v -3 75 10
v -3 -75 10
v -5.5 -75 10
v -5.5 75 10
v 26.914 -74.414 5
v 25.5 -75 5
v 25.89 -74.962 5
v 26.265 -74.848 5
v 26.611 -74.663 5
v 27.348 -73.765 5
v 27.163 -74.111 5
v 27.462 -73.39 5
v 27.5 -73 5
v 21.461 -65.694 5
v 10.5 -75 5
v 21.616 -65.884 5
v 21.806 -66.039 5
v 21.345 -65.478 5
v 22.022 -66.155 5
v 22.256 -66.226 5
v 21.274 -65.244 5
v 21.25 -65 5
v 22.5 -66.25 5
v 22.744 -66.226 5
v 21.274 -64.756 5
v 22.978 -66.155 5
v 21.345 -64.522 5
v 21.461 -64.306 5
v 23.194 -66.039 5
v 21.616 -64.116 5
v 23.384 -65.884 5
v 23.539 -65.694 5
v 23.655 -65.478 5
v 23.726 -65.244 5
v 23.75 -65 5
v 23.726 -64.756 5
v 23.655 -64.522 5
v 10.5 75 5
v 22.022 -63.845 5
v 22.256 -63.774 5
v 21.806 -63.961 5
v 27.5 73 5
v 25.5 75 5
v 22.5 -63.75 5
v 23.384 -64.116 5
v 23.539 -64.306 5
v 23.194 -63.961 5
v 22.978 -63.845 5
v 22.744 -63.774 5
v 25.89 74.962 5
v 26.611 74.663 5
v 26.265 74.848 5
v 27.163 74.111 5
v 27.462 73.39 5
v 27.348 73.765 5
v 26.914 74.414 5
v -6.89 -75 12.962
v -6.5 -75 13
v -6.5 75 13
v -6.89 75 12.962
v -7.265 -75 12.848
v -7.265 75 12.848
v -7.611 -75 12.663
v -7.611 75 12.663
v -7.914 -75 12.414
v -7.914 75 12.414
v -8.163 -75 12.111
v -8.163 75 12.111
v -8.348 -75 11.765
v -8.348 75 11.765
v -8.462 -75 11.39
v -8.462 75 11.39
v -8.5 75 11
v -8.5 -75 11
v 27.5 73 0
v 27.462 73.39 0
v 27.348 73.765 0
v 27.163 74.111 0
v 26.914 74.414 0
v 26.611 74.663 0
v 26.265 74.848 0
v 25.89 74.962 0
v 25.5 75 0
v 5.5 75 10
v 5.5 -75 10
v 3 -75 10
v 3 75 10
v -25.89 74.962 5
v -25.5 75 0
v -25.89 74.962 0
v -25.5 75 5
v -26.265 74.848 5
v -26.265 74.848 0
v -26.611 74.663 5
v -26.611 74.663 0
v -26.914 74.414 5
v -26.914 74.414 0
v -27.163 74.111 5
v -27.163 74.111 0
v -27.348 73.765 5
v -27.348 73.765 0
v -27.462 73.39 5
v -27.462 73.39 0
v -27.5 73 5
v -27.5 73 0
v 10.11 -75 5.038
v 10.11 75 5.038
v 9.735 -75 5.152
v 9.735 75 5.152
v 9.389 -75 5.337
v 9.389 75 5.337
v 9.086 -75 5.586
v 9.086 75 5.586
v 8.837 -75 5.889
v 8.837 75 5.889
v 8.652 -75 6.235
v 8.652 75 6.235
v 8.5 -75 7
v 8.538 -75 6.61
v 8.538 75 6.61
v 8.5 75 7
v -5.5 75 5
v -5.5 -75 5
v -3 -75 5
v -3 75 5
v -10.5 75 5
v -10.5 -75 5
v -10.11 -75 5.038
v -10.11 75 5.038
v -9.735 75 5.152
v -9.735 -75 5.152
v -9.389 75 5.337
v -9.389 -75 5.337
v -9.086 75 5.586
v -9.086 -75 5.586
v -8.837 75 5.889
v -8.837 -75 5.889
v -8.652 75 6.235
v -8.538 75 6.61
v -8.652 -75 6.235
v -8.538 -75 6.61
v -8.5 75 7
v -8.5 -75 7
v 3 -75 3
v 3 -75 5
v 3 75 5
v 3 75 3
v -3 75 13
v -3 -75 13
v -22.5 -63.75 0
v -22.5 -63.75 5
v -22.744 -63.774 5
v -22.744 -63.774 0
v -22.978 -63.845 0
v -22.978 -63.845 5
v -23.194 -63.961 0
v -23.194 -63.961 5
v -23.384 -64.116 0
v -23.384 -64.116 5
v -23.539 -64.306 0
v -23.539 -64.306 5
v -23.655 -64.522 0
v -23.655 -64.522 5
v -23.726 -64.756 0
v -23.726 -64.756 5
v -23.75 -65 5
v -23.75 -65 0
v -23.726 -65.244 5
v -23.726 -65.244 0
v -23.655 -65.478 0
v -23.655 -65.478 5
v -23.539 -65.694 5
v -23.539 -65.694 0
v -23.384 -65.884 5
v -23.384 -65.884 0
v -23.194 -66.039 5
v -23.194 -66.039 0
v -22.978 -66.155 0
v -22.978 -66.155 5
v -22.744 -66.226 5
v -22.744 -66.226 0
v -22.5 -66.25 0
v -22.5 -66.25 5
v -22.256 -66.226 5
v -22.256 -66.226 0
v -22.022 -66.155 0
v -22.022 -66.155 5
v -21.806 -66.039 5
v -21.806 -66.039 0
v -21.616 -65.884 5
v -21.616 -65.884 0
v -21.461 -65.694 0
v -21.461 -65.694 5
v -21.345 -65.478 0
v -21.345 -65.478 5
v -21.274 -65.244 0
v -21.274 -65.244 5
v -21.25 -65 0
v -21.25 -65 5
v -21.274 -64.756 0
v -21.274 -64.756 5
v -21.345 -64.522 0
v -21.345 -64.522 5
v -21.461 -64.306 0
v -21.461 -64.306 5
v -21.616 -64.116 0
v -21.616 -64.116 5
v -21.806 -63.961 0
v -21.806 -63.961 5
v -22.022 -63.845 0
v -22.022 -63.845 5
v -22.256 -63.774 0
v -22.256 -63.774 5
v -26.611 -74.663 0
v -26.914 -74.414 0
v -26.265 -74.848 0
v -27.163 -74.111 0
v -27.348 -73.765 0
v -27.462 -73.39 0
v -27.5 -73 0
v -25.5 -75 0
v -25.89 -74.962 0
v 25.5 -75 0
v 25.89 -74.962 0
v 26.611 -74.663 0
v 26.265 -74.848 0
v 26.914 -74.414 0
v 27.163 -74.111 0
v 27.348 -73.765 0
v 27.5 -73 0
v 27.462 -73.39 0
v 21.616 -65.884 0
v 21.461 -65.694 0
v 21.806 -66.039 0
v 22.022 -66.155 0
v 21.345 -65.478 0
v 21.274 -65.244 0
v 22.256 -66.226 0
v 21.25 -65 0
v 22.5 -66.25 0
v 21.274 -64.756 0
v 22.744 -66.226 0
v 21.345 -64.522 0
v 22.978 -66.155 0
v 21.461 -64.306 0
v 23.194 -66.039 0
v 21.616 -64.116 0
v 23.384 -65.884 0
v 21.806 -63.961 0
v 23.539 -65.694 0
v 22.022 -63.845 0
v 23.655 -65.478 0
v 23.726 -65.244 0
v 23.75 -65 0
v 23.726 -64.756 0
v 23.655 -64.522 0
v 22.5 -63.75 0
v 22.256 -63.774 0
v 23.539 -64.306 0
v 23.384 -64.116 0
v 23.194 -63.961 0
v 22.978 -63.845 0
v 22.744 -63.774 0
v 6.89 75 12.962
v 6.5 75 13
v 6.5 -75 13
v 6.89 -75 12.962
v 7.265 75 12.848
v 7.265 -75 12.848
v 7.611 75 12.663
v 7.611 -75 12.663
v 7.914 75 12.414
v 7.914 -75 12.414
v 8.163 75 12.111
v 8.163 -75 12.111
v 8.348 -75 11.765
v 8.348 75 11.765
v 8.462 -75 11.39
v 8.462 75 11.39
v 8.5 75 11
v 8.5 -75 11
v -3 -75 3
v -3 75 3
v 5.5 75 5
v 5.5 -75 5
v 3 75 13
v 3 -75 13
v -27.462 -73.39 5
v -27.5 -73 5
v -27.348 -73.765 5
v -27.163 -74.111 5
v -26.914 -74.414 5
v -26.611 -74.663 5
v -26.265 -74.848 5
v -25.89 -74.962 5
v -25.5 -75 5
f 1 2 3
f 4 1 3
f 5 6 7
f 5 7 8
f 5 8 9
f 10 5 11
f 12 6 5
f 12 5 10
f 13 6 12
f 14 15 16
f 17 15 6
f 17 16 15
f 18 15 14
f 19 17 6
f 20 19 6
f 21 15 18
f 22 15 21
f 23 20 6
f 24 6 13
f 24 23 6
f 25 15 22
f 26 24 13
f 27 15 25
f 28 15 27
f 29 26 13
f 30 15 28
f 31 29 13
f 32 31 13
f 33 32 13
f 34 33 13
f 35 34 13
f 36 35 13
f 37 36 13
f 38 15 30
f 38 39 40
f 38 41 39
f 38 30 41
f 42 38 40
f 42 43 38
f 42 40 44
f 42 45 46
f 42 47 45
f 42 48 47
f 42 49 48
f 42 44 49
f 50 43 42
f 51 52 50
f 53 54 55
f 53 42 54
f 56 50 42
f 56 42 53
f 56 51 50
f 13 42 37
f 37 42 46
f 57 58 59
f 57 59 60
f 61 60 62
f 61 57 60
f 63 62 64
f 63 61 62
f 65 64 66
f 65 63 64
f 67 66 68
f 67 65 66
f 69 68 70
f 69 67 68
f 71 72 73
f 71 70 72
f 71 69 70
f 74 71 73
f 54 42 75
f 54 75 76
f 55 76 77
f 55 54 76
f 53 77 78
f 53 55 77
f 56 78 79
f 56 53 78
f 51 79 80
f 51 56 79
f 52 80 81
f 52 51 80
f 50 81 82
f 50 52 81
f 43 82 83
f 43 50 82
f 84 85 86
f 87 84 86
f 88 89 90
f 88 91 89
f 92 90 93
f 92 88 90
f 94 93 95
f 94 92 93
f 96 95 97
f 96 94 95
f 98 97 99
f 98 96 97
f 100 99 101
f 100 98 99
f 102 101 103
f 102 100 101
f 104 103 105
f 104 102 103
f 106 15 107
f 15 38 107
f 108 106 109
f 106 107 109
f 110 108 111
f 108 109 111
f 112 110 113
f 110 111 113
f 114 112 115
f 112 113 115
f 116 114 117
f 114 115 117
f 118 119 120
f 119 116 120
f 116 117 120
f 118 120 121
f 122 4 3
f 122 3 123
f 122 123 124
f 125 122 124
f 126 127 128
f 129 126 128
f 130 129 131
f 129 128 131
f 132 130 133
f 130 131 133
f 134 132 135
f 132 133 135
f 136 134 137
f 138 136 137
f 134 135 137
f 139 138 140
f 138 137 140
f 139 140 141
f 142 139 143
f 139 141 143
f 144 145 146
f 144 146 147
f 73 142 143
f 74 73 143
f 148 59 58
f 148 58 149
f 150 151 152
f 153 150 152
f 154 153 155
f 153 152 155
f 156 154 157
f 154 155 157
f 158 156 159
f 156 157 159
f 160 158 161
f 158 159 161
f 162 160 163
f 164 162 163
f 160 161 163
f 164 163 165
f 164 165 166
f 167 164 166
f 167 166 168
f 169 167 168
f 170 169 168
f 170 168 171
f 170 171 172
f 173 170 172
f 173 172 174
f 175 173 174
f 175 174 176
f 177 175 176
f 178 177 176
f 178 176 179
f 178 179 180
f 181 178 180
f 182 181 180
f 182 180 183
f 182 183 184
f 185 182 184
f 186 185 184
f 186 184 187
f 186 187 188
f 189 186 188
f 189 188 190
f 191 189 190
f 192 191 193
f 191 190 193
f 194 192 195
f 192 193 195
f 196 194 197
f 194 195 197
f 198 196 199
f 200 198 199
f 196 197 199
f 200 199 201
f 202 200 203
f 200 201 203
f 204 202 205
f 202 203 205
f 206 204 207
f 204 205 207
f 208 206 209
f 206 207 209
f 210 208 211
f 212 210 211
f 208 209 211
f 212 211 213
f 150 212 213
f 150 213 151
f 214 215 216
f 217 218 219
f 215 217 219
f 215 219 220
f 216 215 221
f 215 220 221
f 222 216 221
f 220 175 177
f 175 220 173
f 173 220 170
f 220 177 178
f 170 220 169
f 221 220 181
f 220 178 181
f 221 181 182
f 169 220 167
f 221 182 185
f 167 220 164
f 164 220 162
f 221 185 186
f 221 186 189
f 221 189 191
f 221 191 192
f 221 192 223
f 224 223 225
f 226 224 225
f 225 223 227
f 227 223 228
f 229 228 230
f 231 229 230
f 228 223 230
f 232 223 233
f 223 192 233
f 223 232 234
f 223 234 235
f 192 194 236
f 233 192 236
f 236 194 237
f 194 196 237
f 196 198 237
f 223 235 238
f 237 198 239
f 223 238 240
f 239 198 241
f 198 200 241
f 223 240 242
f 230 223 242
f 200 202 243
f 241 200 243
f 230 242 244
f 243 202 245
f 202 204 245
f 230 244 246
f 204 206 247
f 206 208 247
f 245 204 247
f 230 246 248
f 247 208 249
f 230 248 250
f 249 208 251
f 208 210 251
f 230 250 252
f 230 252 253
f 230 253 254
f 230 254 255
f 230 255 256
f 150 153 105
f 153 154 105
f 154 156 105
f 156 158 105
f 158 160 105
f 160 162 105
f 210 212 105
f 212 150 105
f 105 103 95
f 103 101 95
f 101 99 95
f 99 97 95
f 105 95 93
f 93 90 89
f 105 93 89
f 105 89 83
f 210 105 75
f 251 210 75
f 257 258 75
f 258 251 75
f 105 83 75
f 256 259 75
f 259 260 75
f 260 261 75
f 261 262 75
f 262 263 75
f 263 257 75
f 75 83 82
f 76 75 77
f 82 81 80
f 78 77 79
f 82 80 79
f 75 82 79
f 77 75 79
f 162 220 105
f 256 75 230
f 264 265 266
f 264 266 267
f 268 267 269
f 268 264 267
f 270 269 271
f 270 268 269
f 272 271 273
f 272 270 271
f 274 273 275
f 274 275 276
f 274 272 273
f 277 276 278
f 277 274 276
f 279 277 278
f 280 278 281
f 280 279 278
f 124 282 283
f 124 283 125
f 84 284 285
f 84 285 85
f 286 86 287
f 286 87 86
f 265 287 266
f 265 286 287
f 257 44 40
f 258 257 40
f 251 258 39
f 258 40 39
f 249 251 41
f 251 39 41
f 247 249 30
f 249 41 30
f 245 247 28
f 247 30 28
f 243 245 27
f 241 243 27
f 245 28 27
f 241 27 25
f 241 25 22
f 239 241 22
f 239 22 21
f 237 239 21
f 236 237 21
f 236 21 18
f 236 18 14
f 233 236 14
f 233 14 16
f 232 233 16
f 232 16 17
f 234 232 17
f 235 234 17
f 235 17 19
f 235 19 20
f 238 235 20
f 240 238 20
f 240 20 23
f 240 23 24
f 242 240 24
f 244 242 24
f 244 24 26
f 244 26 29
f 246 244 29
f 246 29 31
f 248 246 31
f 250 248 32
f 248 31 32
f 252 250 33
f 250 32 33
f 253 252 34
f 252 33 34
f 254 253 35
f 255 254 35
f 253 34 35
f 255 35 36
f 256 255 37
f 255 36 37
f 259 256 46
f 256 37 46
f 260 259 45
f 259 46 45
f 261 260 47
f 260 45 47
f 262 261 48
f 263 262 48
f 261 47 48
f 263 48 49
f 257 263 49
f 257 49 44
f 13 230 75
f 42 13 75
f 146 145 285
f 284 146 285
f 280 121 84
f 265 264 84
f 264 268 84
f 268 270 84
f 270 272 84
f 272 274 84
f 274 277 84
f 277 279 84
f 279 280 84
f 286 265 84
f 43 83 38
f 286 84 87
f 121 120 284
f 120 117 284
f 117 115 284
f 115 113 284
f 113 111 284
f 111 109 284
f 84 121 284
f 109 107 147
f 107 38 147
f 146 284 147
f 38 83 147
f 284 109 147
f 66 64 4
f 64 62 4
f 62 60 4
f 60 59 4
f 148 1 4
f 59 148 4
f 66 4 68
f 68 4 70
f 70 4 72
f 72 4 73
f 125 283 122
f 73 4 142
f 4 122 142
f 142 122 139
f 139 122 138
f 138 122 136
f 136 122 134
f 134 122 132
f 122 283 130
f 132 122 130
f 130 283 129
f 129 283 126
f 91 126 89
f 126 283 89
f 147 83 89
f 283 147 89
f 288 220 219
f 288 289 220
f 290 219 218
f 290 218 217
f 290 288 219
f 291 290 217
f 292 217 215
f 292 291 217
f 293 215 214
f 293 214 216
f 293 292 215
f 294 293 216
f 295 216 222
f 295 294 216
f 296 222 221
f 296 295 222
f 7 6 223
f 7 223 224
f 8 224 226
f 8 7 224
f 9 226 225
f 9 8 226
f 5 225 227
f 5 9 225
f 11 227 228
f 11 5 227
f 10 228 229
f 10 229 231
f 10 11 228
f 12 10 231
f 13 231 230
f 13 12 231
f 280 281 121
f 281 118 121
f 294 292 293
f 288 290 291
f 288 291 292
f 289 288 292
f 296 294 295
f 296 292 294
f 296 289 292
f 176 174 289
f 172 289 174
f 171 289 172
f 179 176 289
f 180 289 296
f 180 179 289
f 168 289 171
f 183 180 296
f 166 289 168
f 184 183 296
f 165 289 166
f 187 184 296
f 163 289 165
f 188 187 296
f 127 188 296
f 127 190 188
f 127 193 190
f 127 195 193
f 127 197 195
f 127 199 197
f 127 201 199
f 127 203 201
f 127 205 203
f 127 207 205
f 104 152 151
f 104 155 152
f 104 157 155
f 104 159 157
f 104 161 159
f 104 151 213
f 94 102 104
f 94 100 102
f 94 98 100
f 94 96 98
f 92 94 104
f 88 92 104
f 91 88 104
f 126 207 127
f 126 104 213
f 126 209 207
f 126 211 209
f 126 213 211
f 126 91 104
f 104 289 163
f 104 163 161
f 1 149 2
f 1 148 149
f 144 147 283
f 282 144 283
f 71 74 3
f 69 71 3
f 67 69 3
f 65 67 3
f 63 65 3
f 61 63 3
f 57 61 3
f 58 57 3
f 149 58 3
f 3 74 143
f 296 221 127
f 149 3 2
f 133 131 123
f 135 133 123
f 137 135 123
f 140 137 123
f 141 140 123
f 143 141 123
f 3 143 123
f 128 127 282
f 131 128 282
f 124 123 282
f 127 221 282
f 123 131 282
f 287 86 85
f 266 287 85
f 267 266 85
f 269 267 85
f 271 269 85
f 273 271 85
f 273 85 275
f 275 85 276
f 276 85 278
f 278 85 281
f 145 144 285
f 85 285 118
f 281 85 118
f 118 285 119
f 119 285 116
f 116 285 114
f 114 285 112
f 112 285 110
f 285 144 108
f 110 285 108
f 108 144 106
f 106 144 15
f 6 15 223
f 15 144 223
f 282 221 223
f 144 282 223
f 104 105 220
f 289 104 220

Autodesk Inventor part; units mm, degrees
ref_plane "YZ Plane" through (0, 0, 0) normal (1, 0, 0) x (0, 1, 0)
ref_plane "XZ Plane" through (0, 0, 0) normal (0, 1, 0) x (-1, 0, 0)
ref_plane "XY Plane" through (0, 0, 0) normal (0, 0, 1) x (1, 0, 0)
sketch "スケッチ1" plane through (0, 0, 0) normal (0, 0, 1) x (1, 0, 0)
  line L0 (-27.5, -75) -> (27.5, -75)
  line L1 (27.5, -75) -> (27.5, 75)
  line L2 (27.5, 75) -> (-27.5, 75)
  line L3 (-27.5, 75) -> (-27.5, -75)
  line L4 (-27.5, -75) -> (27.5, 75) construction
  line L5 (27.5, -75) -> (-27.5, 75) construction
  point P0 (0, 0)
  dimension "d0" = 55
  dimension "d1" = 150
extrude "押し出し1" add sketch "スケッチ1" along normal blind 5
sketch "スケッチ2" plane through (0, 0, 5) normal (0, 0, 1) x (1, 0, 0)
  line L0 (27.5, 75) -> (-27.5, 75) projected
  line L1 (-8.5, -75) -> (8.5, -75)
  line L2 (8.5, -75) -> (8.5, 75)
  line L3 (8.5, 75) -> (-8.5, 75)
  line L4 (-8.5, 75) -> (-8.5, -75)
  line L5 (-8.5, -75) -> (8.5, 75) construction
  line L6 (8.5, -75) -> (-8.5, 75) construction
  point P0 (0, 0)
  dimension "d4" = 17
extrude "押し出し2" add sketch "スケッチ2" along normal blind 8
sketch "スケッチ3" plane through (-27.5, 75, 0) normal (0, 1, 0) x (1, 0, 0)
  line L0 (55, 0) -> (0, 0) projected
  line L1 (0, 0) -> (0, -5) projected
  line L2 (19, -5) -> (0, -5) projected
  line L3 (19, -5) -> (19, -13) projected
  line L4 (36, -13) -> (19, -13) projected
  line L5 (36, -5) -> (36, -13) projected
  line L6 (55, -5) -> (36, -5) projected
  line L7 (55, 0) -> (55, -5) projected
  line L8 (36, -5) -> (36, -13) projected
  line L9 (19, -5) -> (36, -5)
  line L10 (36, -5) -> (36, -10)
  line L11 (36, -10) -> (19, -10)
  line L12 (19, -10) -> (19, -5)
  line L13 (22, -5) -> (33, -5)
  line L14 (33, -5) -> (33, -10)
  line L15 (33, -10) -> (22, -10)
  line L16 (22, -10) -> (22, -5)
  line L17 (19, -13) -> (36, -13) projected
  line L18 (24.5, -10) -> (30.5, -10)
  line L19 (30.5, -10) -> (30.5, -13)
  line L20 (30.5, -13) -> (24.5, -13)
  line L21 (24.5, -13) -> (24.5, -10)
  line L22 (24.5, -5) -> (30.5, -5)
  line L23 (30.5, -5) -> (30.5, -3)
  line L24 (30.5, -3) -> (24.5, -3)
  line L25 (24.5, -3) -> (24.5, -5)
  point P0 (27.5, 0)
  dimension "d7" = 5
  dimension "d8" = 11
  dimension "d9" = 3
  dimension "d10" = 6
  dimension "d11" = 5.5
  dimension "d14" = 2
extrude "押し出し3" cut sketch "スケッチ3" against normal through all contours L14 L11 L16 L9 | L9 L25 L24 L23 | L4 L21 L11 L19
sketch "スケッチ4" plane through (0, 0, 0) normal (0, 0, -1) x (-1, 0, 0)
  line L0 (27.5, -75) -> (-27.5, -75) projected
  line L1 (-27.5, -75) -> (-27.5, 75) projected
  point P0 (0, 0)
  point P1 (-22.5, -65)
  point P2 (22.5, -65)
  dimension "d15" = 10
  dimension "d16" = 10
  dimension "d17" = 45
  dimension "d18" = 5
hole "穴1" at (22.5, -65, 0) at (-22.5, -65, 0) direction (0, 0, 1) diameter 2.5 end through all
fillet "フィレット1" radius 2 8 edges at (-8.5, 0, 5) (8.5, 0, 5) (8.5, 0, 13) (-8.5, 0, 13) (27.5, -75, 2.5) (-27.5, -75, 2.5) (27.5, 75, 2.5) (-27.5, 75, 2.5)
properties part number "slide_part"
